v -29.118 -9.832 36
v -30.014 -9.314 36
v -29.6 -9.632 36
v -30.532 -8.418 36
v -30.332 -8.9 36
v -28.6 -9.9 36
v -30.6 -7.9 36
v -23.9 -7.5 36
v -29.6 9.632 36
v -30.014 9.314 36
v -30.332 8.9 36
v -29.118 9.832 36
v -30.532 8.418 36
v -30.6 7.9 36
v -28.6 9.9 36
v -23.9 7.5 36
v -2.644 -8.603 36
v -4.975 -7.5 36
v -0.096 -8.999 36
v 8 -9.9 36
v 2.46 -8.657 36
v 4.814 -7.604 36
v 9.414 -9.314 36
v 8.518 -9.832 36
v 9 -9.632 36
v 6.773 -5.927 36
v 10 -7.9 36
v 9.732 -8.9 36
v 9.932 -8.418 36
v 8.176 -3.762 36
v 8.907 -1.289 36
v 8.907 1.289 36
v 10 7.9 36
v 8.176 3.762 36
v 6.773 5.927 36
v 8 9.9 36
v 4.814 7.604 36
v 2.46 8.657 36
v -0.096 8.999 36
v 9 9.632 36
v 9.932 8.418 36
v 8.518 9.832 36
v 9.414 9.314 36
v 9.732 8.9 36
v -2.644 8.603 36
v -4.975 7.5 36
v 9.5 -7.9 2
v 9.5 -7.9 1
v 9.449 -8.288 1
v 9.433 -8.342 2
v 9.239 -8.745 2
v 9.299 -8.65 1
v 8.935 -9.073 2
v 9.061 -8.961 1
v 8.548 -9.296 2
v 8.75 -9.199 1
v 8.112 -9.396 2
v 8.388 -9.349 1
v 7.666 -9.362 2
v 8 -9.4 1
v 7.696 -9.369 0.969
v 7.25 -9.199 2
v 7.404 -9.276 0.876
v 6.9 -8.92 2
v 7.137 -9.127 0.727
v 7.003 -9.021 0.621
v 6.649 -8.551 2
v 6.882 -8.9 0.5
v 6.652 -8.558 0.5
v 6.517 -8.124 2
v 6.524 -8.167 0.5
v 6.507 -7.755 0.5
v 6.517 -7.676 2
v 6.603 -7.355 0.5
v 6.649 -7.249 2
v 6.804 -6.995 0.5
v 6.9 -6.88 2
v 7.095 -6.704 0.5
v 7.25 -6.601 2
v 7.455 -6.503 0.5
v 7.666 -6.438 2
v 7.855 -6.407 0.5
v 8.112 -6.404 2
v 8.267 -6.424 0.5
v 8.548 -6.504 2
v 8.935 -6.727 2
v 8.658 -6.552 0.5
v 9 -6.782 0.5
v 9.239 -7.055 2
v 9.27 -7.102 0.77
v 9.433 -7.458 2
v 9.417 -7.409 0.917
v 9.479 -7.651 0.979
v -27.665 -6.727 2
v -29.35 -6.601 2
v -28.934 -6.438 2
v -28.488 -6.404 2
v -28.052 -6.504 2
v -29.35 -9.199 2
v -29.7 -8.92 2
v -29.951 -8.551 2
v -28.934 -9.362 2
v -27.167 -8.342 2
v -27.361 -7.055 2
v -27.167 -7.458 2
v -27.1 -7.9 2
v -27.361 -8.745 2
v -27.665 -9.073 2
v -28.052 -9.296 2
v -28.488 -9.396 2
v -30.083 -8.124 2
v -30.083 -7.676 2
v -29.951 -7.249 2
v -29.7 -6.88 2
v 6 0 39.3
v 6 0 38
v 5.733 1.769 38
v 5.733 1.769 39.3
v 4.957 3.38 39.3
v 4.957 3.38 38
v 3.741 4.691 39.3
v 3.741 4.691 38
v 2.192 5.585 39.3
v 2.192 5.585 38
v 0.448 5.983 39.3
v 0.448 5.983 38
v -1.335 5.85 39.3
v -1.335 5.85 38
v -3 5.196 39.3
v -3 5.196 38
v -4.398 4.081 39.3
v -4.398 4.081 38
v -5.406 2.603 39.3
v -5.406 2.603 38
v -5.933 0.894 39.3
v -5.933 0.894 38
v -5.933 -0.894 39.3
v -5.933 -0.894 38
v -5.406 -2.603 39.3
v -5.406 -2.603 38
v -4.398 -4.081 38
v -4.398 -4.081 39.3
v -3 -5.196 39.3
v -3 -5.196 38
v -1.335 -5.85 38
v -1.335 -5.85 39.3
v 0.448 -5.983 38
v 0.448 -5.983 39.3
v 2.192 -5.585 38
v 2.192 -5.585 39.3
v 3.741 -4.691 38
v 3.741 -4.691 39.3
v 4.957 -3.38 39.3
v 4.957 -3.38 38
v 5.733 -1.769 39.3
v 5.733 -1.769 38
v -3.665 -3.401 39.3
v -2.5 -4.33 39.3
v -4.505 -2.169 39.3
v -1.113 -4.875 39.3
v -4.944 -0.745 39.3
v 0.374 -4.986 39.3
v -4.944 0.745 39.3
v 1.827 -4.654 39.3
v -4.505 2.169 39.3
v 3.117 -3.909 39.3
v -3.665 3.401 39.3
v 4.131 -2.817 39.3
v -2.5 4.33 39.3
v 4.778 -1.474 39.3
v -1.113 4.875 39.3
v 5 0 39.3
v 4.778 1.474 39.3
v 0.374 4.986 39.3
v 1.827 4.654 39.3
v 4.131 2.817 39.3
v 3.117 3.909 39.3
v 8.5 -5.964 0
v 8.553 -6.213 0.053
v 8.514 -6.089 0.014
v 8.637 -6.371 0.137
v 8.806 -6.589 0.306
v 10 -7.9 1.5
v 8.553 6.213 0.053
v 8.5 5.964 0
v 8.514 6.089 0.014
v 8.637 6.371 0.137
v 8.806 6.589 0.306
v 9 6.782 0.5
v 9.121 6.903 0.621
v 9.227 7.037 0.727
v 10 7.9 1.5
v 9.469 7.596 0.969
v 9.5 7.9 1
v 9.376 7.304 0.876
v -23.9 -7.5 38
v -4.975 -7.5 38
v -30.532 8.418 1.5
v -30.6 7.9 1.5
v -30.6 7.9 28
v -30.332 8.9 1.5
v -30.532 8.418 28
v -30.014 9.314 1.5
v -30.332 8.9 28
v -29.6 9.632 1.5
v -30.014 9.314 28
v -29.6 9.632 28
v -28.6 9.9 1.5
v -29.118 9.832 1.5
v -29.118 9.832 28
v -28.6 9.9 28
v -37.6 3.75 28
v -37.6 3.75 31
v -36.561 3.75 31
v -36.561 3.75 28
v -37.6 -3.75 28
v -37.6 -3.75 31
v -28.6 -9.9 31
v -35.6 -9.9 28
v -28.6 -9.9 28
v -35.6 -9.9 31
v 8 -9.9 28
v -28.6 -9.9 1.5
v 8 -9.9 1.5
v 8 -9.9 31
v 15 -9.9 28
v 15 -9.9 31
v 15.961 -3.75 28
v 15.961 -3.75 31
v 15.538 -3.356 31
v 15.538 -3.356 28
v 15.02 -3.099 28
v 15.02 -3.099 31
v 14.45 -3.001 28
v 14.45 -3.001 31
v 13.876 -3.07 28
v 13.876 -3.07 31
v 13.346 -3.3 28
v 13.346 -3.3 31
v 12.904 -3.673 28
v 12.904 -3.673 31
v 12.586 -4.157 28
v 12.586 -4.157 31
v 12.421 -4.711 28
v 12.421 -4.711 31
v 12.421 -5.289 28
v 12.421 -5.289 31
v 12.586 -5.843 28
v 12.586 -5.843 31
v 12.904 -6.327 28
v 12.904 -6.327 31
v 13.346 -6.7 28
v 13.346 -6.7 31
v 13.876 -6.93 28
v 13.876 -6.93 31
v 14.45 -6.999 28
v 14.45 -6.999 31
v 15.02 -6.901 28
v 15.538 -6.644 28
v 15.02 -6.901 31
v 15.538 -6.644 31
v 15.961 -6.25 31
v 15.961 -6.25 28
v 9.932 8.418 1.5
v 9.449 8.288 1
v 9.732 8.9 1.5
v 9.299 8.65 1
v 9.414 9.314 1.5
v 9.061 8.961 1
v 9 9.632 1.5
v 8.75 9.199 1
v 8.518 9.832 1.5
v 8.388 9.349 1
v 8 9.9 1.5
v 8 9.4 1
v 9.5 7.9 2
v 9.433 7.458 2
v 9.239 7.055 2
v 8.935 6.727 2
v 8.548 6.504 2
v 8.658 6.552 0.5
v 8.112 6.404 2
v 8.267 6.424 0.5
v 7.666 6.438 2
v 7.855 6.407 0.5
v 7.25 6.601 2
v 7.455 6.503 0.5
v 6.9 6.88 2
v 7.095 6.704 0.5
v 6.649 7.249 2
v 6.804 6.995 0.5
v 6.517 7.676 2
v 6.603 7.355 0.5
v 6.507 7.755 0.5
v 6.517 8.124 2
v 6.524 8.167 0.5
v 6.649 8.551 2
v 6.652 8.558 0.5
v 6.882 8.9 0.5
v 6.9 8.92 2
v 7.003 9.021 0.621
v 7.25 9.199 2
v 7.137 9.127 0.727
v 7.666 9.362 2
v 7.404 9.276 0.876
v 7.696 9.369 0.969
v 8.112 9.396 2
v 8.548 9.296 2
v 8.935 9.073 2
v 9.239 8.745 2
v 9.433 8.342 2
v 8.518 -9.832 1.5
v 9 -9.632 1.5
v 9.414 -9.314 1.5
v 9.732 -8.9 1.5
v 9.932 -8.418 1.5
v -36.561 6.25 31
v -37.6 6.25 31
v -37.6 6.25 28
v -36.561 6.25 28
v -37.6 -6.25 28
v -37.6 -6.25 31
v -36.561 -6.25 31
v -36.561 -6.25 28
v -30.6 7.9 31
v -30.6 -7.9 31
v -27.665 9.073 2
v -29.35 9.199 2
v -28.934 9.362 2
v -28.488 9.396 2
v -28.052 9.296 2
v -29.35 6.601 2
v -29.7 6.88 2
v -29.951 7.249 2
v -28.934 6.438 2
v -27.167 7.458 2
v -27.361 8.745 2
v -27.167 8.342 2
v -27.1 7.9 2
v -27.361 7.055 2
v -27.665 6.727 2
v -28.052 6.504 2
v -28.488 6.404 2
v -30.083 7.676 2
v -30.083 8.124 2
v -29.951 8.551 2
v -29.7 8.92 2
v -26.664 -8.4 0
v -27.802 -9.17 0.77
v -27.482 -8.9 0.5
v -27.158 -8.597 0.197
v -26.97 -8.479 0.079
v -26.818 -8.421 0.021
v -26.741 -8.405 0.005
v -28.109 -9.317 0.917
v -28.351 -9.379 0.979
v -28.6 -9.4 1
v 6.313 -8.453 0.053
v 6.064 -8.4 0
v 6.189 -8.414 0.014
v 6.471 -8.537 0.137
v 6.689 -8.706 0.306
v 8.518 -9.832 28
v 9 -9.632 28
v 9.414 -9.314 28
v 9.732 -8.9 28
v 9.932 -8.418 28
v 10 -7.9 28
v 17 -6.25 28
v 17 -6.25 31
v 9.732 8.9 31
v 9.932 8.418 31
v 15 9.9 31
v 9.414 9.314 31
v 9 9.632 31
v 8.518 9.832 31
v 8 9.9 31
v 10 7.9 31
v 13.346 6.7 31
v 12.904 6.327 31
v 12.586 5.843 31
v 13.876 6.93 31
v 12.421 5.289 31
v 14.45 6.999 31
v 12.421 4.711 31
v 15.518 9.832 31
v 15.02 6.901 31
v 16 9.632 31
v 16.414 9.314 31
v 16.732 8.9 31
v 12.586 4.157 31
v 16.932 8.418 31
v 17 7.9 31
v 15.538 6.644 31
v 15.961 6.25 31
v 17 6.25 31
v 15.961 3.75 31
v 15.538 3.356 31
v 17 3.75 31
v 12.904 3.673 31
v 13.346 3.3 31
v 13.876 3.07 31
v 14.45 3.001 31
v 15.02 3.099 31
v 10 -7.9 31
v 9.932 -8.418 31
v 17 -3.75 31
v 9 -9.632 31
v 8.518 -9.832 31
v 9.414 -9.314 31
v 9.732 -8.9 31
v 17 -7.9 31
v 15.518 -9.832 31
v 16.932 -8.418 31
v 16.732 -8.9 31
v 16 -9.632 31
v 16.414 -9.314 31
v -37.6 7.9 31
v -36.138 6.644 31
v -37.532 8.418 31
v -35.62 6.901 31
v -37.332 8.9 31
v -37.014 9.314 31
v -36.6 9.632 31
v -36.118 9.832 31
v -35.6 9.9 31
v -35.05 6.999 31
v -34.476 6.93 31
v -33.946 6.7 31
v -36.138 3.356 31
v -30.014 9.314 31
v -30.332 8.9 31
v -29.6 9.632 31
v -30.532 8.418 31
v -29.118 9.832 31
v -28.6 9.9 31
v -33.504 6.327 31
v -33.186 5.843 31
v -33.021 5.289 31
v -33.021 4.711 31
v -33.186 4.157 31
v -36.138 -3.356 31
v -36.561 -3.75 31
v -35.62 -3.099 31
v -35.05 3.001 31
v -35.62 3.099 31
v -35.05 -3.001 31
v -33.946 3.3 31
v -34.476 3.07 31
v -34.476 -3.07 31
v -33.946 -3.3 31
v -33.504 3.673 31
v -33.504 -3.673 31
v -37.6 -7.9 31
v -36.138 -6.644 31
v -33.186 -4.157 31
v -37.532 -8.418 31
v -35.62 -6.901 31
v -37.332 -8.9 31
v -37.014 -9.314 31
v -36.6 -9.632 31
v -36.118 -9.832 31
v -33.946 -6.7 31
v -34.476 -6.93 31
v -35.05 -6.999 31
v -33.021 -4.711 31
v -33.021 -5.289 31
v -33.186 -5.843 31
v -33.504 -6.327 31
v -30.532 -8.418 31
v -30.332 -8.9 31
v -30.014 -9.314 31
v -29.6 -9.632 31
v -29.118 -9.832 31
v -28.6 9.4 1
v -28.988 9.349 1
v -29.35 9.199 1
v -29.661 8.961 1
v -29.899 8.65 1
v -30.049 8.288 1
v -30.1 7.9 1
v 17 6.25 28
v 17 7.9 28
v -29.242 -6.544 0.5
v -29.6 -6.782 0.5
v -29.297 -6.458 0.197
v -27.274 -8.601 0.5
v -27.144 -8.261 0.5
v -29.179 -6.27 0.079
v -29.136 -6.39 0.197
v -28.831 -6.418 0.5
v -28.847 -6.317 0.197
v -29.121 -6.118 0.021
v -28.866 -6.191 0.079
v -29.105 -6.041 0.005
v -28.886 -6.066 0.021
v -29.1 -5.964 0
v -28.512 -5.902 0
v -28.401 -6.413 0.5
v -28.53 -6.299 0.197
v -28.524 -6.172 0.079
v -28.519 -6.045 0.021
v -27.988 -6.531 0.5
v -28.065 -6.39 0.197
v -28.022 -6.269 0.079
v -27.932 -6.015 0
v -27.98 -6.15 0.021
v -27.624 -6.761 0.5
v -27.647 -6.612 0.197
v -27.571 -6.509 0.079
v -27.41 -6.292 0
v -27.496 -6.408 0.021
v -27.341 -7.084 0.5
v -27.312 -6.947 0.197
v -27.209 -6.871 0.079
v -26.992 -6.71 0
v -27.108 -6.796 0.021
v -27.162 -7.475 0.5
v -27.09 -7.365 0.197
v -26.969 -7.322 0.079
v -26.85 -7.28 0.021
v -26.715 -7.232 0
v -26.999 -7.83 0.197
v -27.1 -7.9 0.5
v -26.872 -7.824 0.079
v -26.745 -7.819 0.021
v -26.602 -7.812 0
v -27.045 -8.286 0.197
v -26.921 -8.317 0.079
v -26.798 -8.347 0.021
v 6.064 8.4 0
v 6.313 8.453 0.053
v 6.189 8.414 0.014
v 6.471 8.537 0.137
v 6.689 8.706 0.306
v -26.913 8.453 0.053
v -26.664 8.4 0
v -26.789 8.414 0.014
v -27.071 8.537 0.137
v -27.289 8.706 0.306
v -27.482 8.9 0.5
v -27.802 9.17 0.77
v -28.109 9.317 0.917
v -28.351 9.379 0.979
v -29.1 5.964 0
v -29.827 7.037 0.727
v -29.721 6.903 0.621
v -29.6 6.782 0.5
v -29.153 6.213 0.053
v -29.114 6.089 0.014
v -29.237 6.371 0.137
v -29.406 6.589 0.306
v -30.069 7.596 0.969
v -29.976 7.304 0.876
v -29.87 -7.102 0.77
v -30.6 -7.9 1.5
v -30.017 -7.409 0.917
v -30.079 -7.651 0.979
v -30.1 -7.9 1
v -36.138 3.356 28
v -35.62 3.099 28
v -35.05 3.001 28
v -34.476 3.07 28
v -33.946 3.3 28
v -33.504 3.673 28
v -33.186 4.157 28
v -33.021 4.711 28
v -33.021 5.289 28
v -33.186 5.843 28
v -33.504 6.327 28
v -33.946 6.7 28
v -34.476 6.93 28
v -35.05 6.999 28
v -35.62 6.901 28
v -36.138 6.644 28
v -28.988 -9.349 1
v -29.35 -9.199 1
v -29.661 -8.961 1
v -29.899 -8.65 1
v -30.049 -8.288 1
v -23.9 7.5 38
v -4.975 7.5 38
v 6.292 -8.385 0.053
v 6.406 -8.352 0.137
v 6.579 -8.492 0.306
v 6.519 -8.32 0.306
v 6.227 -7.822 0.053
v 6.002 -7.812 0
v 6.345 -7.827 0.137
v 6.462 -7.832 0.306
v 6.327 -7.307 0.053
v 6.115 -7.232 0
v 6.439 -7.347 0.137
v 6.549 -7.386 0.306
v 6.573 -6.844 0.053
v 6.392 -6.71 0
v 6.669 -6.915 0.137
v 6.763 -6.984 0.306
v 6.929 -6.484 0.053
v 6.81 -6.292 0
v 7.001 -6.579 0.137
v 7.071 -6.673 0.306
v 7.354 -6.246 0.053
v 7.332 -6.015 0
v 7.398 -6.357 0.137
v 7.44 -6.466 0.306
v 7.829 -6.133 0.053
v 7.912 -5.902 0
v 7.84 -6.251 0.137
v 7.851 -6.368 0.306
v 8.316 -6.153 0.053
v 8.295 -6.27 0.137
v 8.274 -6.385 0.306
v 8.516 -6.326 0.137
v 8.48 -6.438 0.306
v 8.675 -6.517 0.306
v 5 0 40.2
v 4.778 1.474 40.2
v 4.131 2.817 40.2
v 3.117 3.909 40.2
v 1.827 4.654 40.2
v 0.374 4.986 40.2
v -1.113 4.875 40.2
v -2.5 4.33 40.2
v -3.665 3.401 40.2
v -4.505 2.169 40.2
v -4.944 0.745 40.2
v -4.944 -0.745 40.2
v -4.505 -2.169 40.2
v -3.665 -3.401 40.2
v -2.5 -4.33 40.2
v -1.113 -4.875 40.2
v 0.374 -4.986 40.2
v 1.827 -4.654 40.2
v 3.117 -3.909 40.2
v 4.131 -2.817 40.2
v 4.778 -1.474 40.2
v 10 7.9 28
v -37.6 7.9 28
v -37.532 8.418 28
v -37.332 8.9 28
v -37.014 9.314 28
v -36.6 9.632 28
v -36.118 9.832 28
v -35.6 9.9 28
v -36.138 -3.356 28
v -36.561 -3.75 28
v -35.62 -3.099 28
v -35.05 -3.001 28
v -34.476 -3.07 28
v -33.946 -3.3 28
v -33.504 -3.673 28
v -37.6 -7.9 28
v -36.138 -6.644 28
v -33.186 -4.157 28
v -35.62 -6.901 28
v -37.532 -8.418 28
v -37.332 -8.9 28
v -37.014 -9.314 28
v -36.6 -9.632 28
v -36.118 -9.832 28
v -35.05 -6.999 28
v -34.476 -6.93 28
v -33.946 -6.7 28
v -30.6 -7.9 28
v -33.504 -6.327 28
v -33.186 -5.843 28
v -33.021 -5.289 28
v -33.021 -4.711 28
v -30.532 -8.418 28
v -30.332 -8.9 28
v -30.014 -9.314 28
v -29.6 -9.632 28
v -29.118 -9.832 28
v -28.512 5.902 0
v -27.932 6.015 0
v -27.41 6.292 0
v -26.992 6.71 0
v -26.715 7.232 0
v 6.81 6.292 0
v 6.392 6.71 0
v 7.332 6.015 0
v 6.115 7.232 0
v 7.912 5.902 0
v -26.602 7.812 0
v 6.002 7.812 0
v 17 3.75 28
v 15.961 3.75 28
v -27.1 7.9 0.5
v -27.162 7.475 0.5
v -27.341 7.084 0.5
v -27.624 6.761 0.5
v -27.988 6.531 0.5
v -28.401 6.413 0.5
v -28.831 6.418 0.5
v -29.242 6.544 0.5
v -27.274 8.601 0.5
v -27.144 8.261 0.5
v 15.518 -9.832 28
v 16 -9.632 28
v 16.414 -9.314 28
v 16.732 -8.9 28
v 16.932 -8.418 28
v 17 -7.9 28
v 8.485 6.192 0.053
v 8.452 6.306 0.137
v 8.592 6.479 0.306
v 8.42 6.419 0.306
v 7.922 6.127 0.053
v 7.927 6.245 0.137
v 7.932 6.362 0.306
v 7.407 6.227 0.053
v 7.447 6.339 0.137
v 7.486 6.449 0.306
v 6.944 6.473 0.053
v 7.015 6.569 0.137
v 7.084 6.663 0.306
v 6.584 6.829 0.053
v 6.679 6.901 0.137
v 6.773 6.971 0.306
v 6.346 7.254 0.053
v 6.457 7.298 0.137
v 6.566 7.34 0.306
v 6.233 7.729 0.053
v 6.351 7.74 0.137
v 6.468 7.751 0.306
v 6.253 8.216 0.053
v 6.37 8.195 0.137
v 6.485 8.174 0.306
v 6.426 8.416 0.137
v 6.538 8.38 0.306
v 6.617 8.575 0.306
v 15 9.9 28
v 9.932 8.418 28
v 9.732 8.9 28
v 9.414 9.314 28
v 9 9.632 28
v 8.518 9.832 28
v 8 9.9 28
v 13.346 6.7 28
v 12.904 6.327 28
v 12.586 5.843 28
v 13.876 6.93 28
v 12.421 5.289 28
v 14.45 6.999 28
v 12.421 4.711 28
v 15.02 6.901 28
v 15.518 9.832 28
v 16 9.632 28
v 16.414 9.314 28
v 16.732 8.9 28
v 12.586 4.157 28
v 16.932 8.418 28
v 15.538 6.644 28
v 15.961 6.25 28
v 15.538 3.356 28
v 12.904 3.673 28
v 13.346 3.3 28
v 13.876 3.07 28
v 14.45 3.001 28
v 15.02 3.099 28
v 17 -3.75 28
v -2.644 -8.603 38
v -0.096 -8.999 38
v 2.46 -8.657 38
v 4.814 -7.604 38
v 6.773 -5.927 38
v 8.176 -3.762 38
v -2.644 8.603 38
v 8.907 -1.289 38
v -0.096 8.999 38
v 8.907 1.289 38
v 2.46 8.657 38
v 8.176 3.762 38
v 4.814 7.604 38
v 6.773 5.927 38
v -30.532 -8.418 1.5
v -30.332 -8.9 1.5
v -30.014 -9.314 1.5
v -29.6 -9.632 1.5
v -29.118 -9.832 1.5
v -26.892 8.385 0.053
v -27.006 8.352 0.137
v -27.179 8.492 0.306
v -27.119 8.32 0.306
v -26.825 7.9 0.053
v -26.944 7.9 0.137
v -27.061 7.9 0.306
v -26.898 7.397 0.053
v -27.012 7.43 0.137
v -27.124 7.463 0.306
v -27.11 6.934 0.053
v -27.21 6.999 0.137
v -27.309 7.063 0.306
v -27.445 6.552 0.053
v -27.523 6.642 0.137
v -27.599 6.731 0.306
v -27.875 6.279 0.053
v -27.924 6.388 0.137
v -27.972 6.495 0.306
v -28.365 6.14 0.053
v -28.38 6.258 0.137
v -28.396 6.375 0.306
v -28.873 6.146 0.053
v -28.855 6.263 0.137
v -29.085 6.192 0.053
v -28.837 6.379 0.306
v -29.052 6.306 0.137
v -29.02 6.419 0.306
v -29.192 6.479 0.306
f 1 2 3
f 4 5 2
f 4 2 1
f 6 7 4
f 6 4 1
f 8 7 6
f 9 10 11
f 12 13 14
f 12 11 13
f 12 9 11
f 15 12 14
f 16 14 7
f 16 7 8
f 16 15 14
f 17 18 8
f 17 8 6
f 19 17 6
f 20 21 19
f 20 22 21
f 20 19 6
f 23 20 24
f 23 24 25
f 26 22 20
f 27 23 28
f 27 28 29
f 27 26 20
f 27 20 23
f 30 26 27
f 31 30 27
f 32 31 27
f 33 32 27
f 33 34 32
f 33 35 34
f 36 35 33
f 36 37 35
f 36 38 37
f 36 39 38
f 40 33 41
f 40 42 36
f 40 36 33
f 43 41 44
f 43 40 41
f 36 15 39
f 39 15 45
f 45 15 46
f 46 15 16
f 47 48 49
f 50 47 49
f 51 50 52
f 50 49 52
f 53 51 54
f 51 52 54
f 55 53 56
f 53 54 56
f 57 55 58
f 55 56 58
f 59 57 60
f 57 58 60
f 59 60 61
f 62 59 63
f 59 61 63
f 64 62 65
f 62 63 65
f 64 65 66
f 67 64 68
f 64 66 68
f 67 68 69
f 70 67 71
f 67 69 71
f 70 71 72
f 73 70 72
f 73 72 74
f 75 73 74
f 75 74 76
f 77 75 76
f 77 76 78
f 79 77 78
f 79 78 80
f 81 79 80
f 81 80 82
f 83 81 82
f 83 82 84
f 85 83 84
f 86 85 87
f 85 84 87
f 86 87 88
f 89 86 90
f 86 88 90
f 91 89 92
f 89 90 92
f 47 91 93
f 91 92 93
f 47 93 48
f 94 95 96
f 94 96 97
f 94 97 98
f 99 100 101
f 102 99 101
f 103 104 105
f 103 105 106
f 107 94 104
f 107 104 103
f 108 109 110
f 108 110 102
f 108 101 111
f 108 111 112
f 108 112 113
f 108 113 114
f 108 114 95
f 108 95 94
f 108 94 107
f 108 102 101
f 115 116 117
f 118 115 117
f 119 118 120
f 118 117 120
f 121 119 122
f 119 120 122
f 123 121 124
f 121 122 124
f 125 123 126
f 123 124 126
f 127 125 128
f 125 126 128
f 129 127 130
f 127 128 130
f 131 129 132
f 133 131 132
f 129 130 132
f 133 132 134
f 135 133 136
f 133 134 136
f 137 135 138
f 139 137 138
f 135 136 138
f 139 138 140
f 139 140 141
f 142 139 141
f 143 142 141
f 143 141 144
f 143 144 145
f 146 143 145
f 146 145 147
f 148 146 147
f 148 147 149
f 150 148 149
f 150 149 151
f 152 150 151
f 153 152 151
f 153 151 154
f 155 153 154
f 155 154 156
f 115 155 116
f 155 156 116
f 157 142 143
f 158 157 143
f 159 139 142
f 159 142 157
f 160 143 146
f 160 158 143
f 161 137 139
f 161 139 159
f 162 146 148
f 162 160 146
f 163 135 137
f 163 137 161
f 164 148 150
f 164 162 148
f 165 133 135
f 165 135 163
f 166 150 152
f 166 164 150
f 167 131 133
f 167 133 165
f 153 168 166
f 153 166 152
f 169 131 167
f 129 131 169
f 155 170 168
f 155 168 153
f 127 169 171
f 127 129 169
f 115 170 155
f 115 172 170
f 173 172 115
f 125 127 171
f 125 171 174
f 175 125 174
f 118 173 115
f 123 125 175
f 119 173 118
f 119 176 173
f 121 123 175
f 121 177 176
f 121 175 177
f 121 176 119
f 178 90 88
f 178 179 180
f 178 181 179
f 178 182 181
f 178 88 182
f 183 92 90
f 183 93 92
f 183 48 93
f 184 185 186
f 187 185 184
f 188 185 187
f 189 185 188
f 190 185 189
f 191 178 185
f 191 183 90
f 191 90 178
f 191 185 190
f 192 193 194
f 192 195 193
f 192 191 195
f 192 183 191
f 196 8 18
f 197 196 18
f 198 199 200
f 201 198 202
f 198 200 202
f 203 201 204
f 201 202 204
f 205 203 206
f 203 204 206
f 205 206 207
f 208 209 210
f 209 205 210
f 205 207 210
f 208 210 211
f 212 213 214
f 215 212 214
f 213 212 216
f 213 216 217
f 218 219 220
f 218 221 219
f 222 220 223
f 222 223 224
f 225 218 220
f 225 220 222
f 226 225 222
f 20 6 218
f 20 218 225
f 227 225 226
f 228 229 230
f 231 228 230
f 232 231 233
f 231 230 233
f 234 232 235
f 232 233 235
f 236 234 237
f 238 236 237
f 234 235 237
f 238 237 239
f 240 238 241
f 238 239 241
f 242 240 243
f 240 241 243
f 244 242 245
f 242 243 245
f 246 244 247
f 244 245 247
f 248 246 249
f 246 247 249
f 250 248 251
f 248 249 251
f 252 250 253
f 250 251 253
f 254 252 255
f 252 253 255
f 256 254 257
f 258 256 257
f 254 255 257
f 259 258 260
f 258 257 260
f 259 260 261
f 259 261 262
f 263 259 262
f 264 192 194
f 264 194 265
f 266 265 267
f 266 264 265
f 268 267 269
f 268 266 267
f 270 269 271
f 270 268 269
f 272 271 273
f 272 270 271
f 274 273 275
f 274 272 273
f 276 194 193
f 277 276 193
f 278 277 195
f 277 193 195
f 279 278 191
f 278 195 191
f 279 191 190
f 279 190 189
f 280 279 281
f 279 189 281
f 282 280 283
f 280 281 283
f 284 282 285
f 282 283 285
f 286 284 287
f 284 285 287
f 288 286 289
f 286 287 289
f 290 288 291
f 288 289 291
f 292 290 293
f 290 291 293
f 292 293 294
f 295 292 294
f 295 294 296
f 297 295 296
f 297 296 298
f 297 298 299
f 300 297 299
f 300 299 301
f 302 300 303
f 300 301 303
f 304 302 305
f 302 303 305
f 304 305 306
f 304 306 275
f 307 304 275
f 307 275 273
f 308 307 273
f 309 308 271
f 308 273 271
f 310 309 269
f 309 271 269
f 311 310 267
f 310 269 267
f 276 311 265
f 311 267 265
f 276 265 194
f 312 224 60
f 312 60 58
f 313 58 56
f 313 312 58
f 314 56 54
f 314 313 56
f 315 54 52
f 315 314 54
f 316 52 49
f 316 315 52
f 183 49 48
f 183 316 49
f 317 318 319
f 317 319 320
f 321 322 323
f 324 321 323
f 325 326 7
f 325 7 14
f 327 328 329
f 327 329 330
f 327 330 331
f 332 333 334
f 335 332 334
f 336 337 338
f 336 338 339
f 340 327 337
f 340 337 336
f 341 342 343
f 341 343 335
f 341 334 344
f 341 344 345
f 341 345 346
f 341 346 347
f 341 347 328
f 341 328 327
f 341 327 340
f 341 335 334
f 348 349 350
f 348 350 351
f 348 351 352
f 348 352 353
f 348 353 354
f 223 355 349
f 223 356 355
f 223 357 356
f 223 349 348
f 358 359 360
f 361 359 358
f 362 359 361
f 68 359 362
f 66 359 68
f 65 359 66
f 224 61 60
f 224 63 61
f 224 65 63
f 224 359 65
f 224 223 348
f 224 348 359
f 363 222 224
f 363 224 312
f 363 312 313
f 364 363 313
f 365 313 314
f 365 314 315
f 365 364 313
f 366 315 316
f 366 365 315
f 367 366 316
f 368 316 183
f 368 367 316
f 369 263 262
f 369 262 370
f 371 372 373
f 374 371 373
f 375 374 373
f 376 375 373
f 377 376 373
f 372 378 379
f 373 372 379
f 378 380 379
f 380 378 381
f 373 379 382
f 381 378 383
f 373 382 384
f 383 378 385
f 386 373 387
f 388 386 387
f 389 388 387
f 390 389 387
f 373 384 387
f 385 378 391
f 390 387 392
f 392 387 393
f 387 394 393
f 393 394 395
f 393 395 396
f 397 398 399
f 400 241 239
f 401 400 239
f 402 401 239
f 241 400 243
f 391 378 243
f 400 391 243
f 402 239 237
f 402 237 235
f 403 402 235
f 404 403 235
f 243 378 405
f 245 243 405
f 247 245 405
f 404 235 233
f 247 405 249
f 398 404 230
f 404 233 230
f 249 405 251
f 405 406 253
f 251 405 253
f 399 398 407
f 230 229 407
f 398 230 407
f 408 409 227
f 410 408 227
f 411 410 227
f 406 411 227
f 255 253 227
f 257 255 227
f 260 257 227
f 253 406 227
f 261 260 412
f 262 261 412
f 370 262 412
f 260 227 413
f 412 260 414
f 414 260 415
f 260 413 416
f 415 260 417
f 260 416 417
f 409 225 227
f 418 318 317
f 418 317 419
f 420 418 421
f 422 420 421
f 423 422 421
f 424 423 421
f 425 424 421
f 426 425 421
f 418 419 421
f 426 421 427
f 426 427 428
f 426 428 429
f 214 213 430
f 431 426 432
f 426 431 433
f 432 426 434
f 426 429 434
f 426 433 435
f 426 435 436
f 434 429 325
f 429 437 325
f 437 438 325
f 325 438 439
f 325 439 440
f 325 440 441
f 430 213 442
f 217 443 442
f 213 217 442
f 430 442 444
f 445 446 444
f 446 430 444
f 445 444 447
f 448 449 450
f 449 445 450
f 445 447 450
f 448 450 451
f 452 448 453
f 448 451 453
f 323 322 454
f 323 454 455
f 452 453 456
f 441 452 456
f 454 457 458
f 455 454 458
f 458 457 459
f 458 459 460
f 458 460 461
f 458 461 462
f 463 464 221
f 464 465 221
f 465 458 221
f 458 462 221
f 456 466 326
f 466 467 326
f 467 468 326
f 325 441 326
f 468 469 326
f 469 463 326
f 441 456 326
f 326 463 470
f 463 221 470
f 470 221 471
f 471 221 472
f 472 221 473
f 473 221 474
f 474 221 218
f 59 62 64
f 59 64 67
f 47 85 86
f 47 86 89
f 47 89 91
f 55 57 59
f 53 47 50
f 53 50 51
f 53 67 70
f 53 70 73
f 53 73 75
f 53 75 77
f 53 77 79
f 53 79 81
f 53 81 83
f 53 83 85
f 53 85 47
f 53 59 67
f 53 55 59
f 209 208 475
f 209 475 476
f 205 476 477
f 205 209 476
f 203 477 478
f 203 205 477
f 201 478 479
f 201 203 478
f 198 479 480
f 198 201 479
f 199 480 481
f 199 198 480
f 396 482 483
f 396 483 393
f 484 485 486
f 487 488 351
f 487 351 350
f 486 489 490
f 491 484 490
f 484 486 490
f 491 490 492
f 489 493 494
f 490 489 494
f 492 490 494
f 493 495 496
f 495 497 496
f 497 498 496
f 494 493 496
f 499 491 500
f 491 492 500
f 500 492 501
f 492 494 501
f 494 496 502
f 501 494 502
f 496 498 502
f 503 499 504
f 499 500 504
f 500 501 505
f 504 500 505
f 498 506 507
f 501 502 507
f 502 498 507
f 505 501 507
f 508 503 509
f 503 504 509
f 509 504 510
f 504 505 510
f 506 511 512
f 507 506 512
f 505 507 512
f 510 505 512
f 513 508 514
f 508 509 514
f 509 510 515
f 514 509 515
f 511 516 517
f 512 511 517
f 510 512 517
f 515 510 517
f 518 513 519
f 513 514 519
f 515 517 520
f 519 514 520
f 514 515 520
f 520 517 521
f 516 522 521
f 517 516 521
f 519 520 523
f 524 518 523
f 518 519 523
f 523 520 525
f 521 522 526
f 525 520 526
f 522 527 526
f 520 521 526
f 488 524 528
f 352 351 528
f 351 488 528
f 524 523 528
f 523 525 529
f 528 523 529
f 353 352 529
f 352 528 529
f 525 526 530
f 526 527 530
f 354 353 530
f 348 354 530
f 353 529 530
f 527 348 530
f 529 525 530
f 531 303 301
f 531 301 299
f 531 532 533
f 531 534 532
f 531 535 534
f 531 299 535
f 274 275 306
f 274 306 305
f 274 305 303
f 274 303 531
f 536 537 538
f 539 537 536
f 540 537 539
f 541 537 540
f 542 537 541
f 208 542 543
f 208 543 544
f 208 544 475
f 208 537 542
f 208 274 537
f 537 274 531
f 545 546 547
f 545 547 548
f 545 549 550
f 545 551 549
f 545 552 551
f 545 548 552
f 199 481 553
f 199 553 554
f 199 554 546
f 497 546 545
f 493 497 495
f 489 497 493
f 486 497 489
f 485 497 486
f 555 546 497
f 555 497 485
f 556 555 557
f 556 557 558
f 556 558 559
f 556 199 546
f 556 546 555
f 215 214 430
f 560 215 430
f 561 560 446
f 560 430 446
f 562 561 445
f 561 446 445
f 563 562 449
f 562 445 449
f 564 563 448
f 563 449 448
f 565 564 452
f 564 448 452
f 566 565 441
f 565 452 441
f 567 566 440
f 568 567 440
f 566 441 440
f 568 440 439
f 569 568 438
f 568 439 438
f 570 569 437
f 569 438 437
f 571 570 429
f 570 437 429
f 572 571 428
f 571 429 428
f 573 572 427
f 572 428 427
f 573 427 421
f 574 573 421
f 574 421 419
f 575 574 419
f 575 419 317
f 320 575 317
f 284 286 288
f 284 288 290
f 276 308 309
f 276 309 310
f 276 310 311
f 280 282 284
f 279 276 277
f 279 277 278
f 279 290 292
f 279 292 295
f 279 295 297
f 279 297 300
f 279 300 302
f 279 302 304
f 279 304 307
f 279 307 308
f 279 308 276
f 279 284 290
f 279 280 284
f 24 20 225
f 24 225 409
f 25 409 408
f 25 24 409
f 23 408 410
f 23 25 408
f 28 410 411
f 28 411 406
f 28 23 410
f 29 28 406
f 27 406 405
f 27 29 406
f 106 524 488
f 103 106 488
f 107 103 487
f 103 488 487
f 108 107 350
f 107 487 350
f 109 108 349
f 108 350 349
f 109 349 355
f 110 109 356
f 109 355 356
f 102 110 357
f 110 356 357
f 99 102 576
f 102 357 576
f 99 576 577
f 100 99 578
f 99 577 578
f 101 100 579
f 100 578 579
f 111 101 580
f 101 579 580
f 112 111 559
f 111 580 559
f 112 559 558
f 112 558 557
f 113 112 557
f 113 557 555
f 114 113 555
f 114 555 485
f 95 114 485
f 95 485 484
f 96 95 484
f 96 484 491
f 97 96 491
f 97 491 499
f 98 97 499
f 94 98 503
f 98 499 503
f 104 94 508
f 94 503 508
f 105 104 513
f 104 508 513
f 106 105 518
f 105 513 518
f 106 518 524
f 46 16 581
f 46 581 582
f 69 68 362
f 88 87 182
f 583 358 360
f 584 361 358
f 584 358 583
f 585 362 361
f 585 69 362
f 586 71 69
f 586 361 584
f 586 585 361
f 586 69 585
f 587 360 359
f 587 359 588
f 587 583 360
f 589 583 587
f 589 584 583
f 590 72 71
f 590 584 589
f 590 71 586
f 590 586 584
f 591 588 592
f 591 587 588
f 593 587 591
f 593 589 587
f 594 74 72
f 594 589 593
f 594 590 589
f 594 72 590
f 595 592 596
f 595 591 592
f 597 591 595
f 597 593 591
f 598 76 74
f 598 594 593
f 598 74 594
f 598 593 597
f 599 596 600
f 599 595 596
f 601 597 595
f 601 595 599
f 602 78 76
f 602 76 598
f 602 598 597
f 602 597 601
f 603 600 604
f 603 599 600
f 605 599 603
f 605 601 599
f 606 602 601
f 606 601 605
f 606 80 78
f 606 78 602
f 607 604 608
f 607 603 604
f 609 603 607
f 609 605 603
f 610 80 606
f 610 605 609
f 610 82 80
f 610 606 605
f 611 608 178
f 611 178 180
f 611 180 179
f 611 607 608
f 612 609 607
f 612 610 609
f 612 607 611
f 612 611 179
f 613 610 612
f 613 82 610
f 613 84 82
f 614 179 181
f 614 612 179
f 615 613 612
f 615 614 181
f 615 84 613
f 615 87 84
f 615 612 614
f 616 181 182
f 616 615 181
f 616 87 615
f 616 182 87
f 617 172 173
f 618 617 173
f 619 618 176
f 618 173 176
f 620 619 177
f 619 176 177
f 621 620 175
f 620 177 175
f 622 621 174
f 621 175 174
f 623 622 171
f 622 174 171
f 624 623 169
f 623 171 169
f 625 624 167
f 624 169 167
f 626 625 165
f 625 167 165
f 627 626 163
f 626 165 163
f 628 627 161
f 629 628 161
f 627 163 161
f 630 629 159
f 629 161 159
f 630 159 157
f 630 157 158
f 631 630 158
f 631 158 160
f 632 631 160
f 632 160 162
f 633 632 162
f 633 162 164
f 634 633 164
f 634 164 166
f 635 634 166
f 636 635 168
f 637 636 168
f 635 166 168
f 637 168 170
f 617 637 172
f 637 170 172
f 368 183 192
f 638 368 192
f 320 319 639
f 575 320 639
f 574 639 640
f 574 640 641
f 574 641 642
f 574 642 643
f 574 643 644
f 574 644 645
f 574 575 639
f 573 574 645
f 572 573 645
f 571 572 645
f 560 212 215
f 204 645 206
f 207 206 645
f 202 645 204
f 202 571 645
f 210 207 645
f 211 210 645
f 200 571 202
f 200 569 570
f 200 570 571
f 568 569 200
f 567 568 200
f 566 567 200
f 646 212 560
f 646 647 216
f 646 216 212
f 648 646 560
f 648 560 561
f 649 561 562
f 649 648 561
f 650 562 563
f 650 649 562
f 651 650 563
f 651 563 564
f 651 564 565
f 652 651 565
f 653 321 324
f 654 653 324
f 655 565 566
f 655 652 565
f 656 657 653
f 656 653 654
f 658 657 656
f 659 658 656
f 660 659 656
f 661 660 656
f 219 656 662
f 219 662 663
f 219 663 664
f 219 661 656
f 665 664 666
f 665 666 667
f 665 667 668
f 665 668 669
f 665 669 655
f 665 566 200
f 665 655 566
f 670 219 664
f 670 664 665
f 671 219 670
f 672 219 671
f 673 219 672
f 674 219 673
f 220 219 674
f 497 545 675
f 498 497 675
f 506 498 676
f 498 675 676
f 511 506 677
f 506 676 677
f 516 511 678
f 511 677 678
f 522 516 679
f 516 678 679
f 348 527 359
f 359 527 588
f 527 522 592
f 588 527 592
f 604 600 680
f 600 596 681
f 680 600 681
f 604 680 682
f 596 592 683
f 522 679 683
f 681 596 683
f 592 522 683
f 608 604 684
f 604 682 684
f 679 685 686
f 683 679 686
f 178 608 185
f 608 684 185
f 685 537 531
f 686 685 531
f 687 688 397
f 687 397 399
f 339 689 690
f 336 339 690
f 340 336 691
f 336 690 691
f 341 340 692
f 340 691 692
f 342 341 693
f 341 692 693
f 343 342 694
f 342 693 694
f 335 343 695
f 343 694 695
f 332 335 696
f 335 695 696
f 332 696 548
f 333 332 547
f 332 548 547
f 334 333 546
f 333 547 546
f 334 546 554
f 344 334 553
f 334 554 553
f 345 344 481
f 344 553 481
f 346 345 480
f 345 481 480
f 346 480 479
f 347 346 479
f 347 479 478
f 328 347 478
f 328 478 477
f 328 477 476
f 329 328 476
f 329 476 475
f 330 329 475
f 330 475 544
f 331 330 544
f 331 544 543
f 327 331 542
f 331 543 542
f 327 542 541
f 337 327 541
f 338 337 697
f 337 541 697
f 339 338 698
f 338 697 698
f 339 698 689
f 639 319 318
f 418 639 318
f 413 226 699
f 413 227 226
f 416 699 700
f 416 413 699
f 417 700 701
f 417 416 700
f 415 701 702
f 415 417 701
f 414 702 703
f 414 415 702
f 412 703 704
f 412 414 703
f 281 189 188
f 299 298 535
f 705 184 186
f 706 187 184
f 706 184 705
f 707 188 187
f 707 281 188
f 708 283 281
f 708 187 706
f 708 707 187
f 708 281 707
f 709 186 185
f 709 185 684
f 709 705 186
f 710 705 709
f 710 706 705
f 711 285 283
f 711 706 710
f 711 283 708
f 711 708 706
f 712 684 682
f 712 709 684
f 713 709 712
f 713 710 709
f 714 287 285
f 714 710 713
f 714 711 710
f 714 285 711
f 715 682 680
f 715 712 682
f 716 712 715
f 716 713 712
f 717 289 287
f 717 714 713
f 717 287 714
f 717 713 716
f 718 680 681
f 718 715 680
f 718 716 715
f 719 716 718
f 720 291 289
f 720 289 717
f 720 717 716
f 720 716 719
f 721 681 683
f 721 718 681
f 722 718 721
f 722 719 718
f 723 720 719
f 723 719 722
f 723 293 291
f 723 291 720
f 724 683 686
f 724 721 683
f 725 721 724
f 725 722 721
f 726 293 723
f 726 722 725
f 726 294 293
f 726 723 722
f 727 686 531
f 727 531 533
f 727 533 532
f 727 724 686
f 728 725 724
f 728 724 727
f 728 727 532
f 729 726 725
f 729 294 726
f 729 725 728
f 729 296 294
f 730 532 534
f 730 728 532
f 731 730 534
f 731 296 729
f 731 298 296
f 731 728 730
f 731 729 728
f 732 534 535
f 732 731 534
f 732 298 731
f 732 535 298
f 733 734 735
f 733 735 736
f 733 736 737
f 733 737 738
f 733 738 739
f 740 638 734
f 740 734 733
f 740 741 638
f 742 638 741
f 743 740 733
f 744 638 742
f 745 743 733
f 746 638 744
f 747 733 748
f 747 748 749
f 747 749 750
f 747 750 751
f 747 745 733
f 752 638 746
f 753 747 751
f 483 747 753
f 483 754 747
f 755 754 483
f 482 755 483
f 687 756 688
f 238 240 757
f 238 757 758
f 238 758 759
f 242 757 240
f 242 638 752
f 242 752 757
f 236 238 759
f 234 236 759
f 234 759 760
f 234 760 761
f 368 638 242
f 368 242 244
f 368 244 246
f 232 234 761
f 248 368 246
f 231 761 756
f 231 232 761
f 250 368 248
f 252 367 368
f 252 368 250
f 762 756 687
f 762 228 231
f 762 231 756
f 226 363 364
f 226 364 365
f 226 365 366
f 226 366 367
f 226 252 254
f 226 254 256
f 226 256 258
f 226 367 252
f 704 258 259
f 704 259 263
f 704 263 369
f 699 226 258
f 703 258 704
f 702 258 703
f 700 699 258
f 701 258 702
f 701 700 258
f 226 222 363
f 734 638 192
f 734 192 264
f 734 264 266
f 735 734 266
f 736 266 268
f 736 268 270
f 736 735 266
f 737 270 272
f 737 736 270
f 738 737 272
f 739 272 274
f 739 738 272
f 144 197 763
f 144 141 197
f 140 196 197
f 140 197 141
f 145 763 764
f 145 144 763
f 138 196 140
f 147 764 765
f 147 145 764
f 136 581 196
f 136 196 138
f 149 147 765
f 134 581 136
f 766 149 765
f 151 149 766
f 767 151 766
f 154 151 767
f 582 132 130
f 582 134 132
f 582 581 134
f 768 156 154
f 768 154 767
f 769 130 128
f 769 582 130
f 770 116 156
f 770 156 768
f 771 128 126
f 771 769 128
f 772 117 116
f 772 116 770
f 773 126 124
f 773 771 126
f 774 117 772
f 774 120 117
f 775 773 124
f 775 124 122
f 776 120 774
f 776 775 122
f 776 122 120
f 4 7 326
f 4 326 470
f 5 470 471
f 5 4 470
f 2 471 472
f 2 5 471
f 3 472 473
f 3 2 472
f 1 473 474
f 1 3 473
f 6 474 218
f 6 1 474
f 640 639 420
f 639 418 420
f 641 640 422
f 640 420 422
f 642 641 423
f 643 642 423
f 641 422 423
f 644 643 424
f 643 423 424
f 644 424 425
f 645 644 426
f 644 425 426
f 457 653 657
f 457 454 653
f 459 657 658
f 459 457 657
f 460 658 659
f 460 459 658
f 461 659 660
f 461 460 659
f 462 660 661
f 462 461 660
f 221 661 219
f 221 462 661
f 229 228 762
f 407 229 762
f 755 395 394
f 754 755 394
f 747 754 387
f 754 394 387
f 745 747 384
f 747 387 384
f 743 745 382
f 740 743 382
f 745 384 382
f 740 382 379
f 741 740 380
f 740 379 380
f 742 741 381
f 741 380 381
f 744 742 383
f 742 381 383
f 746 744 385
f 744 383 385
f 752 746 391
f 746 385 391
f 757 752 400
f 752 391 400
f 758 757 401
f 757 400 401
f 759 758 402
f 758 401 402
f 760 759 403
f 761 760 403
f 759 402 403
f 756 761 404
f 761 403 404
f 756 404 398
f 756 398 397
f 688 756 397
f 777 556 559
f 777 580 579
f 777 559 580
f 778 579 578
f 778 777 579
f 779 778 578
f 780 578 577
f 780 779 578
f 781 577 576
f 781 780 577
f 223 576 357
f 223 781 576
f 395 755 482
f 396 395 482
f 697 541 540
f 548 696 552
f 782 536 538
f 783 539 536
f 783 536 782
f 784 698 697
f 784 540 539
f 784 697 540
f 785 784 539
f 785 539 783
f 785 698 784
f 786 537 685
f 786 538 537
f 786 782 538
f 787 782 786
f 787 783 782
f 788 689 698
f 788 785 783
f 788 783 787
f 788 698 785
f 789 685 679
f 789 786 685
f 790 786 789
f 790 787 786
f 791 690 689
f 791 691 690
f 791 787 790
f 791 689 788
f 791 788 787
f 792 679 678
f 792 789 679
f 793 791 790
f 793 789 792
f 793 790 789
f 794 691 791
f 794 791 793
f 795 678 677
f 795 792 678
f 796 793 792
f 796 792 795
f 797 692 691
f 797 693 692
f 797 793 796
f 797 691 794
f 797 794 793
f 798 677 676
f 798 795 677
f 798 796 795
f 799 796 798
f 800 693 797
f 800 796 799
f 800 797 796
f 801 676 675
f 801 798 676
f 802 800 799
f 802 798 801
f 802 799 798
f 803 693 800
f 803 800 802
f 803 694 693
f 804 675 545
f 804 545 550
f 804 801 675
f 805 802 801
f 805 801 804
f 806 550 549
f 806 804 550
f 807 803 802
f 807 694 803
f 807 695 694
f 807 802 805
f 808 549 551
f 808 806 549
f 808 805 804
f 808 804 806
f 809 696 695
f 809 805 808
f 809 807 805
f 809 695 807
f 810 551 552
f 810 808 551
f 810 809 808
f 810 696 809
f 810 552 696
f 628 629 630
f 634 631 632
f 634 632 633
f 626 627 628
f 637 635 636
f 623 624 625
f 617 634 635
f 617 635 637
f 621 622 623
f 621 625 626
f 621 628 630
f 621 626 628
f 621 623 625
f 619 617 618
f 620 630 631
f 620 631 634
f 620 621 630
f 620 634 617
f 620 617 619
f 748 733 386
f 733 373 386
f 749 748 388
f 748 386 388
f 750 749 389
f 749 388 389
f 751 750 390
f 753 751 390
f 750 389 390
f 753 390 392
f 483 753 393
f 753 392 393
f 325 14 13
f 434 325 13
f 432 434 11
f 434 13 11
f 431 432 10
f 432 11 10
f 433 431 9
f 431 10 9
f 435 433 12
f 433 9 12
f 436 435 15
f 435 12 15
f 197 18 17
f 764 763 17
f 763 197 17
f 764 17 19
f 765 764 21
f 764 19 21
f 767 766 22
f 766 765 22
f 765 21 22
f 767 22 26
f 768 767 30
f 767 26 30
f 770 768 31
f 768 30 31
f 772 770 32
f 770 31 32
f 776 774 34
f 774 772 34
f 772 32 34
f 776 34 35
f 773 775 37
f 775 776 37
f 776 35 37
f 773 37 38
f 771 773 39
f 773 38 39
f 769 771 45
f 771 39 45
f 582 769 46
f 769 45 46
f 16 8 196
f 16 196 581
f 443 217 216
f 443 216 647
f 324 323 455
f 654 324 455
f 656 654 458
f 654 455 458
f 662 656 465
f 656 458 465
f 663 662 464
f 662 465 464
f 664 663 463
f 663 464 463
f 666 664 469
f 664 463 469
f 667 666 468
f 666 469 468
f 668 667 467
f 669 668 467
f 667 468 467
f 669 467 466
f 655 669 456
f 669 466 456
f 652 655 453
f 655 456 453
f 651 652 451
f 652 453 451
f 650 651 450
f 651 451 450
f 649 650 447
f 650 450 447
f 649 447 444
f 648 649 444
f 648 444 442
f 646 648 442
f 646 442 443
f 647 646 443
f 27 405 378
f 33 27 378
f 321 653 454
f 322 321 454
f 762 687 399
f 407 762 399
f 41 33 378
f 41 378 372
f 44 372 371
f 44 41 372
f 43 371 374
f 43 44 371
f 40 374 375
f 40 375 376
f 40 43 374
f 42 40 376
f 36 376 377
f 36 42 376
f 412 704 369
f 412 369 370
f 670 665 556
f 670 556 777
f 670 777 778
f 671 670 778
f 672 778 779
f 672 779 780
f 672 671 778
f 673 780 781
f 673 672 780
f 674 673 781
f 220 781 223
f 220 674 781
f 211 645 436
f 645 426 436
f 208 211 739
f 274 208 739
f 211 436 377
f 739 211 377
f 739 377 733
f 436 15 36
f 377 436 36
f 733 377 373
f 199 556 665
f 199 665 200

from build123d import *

# Parameters (mm, degrees)
SKETCH007_R      = 6
EXTRUDE007_DEPTH = 1.3
SKETCH008_R      = 5
EXTRUDE008_DEPTH = 0.9
SKETCH004_W      = 5
SKETCH004_H      = 2.5
EXTRUDE004_DEPTH = 3
SKETCH003_R      = 2
EXTRUDE003_DEPTH = 3
SKETCH002_W      = 54.6
SKETCH002_H      = 3
EXTRUDE002_DEPTH = 19.8
SKETCH001_R      = 1.5
EXTRUDE001_DEPTH = 2
SKETCH_W         = 40.6
SKETCH_H         = 19.8
EXTRUDE_DEPTH    = 36
FILLET_R         = 2
CHAMFER_SIZE     = 1.5
FILLET001_R      = 0.5
FILLET002_R      = 2
SKETCH005_R      = 9
EXTRUDE005_DEPTH = 2
SKETCH006_W      = 23.9
SKETCH006_H      = 15
EXTRUDE006_DEPTH = 2


with BuildPart() as extrude007:
    # Sketch007 (on Face81 of Fusion002) → Extrude007 (new body)
    with BuildSketch(Plane.XY.offset(38)):
        Circle(SKETCH007_R)
    extrude(amount=EXTRUDE007_DEPTH)


with BuildPart() as extrude008:
    # Sketch008 (on Face3 of Extrude007) → Extrude008 (new body)
    with BuildSketch(Plane.XY.offset(39.3)):
        Circle(SKETCH008_R)
    extrude(amount=EXTRUDE008_DEPTH)


with BuildPart() as extrude004:
    # Sketch004 (on Face13 of Cut001) → Extrude004 (new body)
    with BuildSketch(Plane.XY.offset(31)):
        with Locations((-37.5, 5)):
            Rectangle(SKETCH004_W, SKETCH004_H)
        with Locations((16.9, 5)):
            Rectangle(SKETCH004_W, SKETCH004_H)
        with Locations((16.9, -5)):
            Rectangle(SKETCH004_W, SKETCH004_H)
        with Locations((-37.5, -5)):
            Rectangle(SKETCH004_W, SKETCH004_H)
    extrude(amount=-EXTRUDE004_DEPTH)


with BuildPart() as extrude003:
    # Sketch003 (on Face11 of Fillet002) → Extrude003 (new body)
    with BuildSketch(Plane.XY.offset(31)):
        with Locations((-35, 5)):
            Circle(SKETCH003_R)
        with Locations((-35, -5)):
            Circle(SKETCH003_R)
        with Locations((14.4, 5)):
            Circle(SKETCH003_R)
        with Locations((14.4, -5)):
            Circle(SKETCH003_R)
    extrude(amount=-EXTRUDE003_DEPTH)


with BuildPart() as extrude002:
    # Sketch002 (on Face6 of Fillet001) → Extrude002 (new body)
    with BuildSketch(Plane.XZ.offset(9.9)):
        with Locations((-10.3, 29.5)):
            Rectangle(SKETCH002_W, SKETCH002_H)
    extrude(amount=-EXTRUDE002_DEPTH)


with BuildPart() as extrude001:
    # Sketch001 (on Face8 of Chamfer) → Extrude001 (new body)
    with BuildSketch(Plane(origin=(0, 0, 0), x_dir=(1, 0, 0), z_dir=(0, 0, -1))):
        with Locations((-28.6, 7.9)):
            Circle(SKETCH001_R)
        with Locations((8, 7.9)):
            Circle(SKETCH001_R)
        with Locations((-28.6, -7.9)):
            Circle(SKETCH001_R)
        with Locations((8, -7.9)):
            Circle(SKETCH001_R)
    extrude(amount=-EXTRUDE001_DEPTH)


with BuildPart() as cut002:
    # Sketch → Extrude (new body)
    with BuildSketch(Plane.XY):
        with Locations((-10.3, 0)):
            Rectangle(SKETCH_W, SKETCH_H)
    extrude(amount=EXTRUDE_DEPTH)

    # Fillet
    fillet_edges = [cut002.edges().sort_by_distance(p)[0] for p in [
        (-30.6, -9.9, 18),
        (10, -9.9, 18),
        (10, 9.9, 18),
        (-30.6, 9.9, 18),
    ]]
    fillet(fillet_edges, radius=FILLET_R)

    # Chamfer
    chamfer_edges = [cut002.edges().sort_by_distance(p)[0] for p in [
        (-10.3, -9.9, 0),
        (-30.014214, -9.314214, 0),
        (9.414214, -9.314214, 0),
        (-30.6, 0, 0),
        (10, 0, 0),
        (-30.014214, 9.314214, 0),
        (9.414214, 9.314214, 0),
        (-10.3, 9.9, 0),
    ]]
    chamfer(chamfer_edges, length=CHAMFER_SIZE)

    # Cut: cut Extrude001
    add(extrude001.part, mode=Mode.SUBTRACT)

    # Fillet001
    fillet001_edges = [cut002.edges().sort_by_distance(p)[0] for p in [
        (-27.733975, -6.675255, 0),
        (-27.733975, 6.675255, 0),
        (6.93934, 6.83934, 0),
        (6.93934, -6.83934, 0),
    ]]
    fillet(fillet001_edges, radius=FILLET001_R)

    # Fusion: union Extrude002
    add(extrude002.part)

    # Fillet002
    fillet002_edges = [cut002.edges().sort_by_distance(p)[0] for p in [
        (-37.6, -9.9, 29.5),
        (-37.6, 9.9, 29.5),
        (17, -9.9, 29.5),
        (17, 9.9, 29.5),
    ]]
    fillet(fillet002_edges, radius=FILLET002_R)

    # Cut001: cut Extrude003
    add(extrude003.part, mode=Mode.SUBTRACT)

    # Cut002: cut Extrude004
    add(extrude004.part, mode=Mode.SUBTRACT)


with BuildPart() as extrude005:
    # Sketch005 (on Face48 of Cut002) → Extrude005 (new body)
    with BuildSketch(Plane.XY.offset(36)):
        Circle(SKETCH005_R)
    extrude(amount=EXTRUDE005_DEPTH)


with BuildPart() as fusion003:
    # Sketch006 (on Face48 of Cut002) → Extrude006 (new body)
    with BuildSketch(Plane.XY.offset(36)):
        with Locations((-11.95, 0)):
            Rectangle(SKETCH006_W, SKETCH006_H)
    extrude(amount=EXTRUDE006_DEPTH)

    # Fusion001: union Extrude005
    add(extrude005.part)

    # Fusion002: union Cut002
    add(cut002.part)

    # Fusion003: union Extrude007, Extrude008
    add(extrude007.part)
    add(extrude008.part)


solid = fusion003.part
